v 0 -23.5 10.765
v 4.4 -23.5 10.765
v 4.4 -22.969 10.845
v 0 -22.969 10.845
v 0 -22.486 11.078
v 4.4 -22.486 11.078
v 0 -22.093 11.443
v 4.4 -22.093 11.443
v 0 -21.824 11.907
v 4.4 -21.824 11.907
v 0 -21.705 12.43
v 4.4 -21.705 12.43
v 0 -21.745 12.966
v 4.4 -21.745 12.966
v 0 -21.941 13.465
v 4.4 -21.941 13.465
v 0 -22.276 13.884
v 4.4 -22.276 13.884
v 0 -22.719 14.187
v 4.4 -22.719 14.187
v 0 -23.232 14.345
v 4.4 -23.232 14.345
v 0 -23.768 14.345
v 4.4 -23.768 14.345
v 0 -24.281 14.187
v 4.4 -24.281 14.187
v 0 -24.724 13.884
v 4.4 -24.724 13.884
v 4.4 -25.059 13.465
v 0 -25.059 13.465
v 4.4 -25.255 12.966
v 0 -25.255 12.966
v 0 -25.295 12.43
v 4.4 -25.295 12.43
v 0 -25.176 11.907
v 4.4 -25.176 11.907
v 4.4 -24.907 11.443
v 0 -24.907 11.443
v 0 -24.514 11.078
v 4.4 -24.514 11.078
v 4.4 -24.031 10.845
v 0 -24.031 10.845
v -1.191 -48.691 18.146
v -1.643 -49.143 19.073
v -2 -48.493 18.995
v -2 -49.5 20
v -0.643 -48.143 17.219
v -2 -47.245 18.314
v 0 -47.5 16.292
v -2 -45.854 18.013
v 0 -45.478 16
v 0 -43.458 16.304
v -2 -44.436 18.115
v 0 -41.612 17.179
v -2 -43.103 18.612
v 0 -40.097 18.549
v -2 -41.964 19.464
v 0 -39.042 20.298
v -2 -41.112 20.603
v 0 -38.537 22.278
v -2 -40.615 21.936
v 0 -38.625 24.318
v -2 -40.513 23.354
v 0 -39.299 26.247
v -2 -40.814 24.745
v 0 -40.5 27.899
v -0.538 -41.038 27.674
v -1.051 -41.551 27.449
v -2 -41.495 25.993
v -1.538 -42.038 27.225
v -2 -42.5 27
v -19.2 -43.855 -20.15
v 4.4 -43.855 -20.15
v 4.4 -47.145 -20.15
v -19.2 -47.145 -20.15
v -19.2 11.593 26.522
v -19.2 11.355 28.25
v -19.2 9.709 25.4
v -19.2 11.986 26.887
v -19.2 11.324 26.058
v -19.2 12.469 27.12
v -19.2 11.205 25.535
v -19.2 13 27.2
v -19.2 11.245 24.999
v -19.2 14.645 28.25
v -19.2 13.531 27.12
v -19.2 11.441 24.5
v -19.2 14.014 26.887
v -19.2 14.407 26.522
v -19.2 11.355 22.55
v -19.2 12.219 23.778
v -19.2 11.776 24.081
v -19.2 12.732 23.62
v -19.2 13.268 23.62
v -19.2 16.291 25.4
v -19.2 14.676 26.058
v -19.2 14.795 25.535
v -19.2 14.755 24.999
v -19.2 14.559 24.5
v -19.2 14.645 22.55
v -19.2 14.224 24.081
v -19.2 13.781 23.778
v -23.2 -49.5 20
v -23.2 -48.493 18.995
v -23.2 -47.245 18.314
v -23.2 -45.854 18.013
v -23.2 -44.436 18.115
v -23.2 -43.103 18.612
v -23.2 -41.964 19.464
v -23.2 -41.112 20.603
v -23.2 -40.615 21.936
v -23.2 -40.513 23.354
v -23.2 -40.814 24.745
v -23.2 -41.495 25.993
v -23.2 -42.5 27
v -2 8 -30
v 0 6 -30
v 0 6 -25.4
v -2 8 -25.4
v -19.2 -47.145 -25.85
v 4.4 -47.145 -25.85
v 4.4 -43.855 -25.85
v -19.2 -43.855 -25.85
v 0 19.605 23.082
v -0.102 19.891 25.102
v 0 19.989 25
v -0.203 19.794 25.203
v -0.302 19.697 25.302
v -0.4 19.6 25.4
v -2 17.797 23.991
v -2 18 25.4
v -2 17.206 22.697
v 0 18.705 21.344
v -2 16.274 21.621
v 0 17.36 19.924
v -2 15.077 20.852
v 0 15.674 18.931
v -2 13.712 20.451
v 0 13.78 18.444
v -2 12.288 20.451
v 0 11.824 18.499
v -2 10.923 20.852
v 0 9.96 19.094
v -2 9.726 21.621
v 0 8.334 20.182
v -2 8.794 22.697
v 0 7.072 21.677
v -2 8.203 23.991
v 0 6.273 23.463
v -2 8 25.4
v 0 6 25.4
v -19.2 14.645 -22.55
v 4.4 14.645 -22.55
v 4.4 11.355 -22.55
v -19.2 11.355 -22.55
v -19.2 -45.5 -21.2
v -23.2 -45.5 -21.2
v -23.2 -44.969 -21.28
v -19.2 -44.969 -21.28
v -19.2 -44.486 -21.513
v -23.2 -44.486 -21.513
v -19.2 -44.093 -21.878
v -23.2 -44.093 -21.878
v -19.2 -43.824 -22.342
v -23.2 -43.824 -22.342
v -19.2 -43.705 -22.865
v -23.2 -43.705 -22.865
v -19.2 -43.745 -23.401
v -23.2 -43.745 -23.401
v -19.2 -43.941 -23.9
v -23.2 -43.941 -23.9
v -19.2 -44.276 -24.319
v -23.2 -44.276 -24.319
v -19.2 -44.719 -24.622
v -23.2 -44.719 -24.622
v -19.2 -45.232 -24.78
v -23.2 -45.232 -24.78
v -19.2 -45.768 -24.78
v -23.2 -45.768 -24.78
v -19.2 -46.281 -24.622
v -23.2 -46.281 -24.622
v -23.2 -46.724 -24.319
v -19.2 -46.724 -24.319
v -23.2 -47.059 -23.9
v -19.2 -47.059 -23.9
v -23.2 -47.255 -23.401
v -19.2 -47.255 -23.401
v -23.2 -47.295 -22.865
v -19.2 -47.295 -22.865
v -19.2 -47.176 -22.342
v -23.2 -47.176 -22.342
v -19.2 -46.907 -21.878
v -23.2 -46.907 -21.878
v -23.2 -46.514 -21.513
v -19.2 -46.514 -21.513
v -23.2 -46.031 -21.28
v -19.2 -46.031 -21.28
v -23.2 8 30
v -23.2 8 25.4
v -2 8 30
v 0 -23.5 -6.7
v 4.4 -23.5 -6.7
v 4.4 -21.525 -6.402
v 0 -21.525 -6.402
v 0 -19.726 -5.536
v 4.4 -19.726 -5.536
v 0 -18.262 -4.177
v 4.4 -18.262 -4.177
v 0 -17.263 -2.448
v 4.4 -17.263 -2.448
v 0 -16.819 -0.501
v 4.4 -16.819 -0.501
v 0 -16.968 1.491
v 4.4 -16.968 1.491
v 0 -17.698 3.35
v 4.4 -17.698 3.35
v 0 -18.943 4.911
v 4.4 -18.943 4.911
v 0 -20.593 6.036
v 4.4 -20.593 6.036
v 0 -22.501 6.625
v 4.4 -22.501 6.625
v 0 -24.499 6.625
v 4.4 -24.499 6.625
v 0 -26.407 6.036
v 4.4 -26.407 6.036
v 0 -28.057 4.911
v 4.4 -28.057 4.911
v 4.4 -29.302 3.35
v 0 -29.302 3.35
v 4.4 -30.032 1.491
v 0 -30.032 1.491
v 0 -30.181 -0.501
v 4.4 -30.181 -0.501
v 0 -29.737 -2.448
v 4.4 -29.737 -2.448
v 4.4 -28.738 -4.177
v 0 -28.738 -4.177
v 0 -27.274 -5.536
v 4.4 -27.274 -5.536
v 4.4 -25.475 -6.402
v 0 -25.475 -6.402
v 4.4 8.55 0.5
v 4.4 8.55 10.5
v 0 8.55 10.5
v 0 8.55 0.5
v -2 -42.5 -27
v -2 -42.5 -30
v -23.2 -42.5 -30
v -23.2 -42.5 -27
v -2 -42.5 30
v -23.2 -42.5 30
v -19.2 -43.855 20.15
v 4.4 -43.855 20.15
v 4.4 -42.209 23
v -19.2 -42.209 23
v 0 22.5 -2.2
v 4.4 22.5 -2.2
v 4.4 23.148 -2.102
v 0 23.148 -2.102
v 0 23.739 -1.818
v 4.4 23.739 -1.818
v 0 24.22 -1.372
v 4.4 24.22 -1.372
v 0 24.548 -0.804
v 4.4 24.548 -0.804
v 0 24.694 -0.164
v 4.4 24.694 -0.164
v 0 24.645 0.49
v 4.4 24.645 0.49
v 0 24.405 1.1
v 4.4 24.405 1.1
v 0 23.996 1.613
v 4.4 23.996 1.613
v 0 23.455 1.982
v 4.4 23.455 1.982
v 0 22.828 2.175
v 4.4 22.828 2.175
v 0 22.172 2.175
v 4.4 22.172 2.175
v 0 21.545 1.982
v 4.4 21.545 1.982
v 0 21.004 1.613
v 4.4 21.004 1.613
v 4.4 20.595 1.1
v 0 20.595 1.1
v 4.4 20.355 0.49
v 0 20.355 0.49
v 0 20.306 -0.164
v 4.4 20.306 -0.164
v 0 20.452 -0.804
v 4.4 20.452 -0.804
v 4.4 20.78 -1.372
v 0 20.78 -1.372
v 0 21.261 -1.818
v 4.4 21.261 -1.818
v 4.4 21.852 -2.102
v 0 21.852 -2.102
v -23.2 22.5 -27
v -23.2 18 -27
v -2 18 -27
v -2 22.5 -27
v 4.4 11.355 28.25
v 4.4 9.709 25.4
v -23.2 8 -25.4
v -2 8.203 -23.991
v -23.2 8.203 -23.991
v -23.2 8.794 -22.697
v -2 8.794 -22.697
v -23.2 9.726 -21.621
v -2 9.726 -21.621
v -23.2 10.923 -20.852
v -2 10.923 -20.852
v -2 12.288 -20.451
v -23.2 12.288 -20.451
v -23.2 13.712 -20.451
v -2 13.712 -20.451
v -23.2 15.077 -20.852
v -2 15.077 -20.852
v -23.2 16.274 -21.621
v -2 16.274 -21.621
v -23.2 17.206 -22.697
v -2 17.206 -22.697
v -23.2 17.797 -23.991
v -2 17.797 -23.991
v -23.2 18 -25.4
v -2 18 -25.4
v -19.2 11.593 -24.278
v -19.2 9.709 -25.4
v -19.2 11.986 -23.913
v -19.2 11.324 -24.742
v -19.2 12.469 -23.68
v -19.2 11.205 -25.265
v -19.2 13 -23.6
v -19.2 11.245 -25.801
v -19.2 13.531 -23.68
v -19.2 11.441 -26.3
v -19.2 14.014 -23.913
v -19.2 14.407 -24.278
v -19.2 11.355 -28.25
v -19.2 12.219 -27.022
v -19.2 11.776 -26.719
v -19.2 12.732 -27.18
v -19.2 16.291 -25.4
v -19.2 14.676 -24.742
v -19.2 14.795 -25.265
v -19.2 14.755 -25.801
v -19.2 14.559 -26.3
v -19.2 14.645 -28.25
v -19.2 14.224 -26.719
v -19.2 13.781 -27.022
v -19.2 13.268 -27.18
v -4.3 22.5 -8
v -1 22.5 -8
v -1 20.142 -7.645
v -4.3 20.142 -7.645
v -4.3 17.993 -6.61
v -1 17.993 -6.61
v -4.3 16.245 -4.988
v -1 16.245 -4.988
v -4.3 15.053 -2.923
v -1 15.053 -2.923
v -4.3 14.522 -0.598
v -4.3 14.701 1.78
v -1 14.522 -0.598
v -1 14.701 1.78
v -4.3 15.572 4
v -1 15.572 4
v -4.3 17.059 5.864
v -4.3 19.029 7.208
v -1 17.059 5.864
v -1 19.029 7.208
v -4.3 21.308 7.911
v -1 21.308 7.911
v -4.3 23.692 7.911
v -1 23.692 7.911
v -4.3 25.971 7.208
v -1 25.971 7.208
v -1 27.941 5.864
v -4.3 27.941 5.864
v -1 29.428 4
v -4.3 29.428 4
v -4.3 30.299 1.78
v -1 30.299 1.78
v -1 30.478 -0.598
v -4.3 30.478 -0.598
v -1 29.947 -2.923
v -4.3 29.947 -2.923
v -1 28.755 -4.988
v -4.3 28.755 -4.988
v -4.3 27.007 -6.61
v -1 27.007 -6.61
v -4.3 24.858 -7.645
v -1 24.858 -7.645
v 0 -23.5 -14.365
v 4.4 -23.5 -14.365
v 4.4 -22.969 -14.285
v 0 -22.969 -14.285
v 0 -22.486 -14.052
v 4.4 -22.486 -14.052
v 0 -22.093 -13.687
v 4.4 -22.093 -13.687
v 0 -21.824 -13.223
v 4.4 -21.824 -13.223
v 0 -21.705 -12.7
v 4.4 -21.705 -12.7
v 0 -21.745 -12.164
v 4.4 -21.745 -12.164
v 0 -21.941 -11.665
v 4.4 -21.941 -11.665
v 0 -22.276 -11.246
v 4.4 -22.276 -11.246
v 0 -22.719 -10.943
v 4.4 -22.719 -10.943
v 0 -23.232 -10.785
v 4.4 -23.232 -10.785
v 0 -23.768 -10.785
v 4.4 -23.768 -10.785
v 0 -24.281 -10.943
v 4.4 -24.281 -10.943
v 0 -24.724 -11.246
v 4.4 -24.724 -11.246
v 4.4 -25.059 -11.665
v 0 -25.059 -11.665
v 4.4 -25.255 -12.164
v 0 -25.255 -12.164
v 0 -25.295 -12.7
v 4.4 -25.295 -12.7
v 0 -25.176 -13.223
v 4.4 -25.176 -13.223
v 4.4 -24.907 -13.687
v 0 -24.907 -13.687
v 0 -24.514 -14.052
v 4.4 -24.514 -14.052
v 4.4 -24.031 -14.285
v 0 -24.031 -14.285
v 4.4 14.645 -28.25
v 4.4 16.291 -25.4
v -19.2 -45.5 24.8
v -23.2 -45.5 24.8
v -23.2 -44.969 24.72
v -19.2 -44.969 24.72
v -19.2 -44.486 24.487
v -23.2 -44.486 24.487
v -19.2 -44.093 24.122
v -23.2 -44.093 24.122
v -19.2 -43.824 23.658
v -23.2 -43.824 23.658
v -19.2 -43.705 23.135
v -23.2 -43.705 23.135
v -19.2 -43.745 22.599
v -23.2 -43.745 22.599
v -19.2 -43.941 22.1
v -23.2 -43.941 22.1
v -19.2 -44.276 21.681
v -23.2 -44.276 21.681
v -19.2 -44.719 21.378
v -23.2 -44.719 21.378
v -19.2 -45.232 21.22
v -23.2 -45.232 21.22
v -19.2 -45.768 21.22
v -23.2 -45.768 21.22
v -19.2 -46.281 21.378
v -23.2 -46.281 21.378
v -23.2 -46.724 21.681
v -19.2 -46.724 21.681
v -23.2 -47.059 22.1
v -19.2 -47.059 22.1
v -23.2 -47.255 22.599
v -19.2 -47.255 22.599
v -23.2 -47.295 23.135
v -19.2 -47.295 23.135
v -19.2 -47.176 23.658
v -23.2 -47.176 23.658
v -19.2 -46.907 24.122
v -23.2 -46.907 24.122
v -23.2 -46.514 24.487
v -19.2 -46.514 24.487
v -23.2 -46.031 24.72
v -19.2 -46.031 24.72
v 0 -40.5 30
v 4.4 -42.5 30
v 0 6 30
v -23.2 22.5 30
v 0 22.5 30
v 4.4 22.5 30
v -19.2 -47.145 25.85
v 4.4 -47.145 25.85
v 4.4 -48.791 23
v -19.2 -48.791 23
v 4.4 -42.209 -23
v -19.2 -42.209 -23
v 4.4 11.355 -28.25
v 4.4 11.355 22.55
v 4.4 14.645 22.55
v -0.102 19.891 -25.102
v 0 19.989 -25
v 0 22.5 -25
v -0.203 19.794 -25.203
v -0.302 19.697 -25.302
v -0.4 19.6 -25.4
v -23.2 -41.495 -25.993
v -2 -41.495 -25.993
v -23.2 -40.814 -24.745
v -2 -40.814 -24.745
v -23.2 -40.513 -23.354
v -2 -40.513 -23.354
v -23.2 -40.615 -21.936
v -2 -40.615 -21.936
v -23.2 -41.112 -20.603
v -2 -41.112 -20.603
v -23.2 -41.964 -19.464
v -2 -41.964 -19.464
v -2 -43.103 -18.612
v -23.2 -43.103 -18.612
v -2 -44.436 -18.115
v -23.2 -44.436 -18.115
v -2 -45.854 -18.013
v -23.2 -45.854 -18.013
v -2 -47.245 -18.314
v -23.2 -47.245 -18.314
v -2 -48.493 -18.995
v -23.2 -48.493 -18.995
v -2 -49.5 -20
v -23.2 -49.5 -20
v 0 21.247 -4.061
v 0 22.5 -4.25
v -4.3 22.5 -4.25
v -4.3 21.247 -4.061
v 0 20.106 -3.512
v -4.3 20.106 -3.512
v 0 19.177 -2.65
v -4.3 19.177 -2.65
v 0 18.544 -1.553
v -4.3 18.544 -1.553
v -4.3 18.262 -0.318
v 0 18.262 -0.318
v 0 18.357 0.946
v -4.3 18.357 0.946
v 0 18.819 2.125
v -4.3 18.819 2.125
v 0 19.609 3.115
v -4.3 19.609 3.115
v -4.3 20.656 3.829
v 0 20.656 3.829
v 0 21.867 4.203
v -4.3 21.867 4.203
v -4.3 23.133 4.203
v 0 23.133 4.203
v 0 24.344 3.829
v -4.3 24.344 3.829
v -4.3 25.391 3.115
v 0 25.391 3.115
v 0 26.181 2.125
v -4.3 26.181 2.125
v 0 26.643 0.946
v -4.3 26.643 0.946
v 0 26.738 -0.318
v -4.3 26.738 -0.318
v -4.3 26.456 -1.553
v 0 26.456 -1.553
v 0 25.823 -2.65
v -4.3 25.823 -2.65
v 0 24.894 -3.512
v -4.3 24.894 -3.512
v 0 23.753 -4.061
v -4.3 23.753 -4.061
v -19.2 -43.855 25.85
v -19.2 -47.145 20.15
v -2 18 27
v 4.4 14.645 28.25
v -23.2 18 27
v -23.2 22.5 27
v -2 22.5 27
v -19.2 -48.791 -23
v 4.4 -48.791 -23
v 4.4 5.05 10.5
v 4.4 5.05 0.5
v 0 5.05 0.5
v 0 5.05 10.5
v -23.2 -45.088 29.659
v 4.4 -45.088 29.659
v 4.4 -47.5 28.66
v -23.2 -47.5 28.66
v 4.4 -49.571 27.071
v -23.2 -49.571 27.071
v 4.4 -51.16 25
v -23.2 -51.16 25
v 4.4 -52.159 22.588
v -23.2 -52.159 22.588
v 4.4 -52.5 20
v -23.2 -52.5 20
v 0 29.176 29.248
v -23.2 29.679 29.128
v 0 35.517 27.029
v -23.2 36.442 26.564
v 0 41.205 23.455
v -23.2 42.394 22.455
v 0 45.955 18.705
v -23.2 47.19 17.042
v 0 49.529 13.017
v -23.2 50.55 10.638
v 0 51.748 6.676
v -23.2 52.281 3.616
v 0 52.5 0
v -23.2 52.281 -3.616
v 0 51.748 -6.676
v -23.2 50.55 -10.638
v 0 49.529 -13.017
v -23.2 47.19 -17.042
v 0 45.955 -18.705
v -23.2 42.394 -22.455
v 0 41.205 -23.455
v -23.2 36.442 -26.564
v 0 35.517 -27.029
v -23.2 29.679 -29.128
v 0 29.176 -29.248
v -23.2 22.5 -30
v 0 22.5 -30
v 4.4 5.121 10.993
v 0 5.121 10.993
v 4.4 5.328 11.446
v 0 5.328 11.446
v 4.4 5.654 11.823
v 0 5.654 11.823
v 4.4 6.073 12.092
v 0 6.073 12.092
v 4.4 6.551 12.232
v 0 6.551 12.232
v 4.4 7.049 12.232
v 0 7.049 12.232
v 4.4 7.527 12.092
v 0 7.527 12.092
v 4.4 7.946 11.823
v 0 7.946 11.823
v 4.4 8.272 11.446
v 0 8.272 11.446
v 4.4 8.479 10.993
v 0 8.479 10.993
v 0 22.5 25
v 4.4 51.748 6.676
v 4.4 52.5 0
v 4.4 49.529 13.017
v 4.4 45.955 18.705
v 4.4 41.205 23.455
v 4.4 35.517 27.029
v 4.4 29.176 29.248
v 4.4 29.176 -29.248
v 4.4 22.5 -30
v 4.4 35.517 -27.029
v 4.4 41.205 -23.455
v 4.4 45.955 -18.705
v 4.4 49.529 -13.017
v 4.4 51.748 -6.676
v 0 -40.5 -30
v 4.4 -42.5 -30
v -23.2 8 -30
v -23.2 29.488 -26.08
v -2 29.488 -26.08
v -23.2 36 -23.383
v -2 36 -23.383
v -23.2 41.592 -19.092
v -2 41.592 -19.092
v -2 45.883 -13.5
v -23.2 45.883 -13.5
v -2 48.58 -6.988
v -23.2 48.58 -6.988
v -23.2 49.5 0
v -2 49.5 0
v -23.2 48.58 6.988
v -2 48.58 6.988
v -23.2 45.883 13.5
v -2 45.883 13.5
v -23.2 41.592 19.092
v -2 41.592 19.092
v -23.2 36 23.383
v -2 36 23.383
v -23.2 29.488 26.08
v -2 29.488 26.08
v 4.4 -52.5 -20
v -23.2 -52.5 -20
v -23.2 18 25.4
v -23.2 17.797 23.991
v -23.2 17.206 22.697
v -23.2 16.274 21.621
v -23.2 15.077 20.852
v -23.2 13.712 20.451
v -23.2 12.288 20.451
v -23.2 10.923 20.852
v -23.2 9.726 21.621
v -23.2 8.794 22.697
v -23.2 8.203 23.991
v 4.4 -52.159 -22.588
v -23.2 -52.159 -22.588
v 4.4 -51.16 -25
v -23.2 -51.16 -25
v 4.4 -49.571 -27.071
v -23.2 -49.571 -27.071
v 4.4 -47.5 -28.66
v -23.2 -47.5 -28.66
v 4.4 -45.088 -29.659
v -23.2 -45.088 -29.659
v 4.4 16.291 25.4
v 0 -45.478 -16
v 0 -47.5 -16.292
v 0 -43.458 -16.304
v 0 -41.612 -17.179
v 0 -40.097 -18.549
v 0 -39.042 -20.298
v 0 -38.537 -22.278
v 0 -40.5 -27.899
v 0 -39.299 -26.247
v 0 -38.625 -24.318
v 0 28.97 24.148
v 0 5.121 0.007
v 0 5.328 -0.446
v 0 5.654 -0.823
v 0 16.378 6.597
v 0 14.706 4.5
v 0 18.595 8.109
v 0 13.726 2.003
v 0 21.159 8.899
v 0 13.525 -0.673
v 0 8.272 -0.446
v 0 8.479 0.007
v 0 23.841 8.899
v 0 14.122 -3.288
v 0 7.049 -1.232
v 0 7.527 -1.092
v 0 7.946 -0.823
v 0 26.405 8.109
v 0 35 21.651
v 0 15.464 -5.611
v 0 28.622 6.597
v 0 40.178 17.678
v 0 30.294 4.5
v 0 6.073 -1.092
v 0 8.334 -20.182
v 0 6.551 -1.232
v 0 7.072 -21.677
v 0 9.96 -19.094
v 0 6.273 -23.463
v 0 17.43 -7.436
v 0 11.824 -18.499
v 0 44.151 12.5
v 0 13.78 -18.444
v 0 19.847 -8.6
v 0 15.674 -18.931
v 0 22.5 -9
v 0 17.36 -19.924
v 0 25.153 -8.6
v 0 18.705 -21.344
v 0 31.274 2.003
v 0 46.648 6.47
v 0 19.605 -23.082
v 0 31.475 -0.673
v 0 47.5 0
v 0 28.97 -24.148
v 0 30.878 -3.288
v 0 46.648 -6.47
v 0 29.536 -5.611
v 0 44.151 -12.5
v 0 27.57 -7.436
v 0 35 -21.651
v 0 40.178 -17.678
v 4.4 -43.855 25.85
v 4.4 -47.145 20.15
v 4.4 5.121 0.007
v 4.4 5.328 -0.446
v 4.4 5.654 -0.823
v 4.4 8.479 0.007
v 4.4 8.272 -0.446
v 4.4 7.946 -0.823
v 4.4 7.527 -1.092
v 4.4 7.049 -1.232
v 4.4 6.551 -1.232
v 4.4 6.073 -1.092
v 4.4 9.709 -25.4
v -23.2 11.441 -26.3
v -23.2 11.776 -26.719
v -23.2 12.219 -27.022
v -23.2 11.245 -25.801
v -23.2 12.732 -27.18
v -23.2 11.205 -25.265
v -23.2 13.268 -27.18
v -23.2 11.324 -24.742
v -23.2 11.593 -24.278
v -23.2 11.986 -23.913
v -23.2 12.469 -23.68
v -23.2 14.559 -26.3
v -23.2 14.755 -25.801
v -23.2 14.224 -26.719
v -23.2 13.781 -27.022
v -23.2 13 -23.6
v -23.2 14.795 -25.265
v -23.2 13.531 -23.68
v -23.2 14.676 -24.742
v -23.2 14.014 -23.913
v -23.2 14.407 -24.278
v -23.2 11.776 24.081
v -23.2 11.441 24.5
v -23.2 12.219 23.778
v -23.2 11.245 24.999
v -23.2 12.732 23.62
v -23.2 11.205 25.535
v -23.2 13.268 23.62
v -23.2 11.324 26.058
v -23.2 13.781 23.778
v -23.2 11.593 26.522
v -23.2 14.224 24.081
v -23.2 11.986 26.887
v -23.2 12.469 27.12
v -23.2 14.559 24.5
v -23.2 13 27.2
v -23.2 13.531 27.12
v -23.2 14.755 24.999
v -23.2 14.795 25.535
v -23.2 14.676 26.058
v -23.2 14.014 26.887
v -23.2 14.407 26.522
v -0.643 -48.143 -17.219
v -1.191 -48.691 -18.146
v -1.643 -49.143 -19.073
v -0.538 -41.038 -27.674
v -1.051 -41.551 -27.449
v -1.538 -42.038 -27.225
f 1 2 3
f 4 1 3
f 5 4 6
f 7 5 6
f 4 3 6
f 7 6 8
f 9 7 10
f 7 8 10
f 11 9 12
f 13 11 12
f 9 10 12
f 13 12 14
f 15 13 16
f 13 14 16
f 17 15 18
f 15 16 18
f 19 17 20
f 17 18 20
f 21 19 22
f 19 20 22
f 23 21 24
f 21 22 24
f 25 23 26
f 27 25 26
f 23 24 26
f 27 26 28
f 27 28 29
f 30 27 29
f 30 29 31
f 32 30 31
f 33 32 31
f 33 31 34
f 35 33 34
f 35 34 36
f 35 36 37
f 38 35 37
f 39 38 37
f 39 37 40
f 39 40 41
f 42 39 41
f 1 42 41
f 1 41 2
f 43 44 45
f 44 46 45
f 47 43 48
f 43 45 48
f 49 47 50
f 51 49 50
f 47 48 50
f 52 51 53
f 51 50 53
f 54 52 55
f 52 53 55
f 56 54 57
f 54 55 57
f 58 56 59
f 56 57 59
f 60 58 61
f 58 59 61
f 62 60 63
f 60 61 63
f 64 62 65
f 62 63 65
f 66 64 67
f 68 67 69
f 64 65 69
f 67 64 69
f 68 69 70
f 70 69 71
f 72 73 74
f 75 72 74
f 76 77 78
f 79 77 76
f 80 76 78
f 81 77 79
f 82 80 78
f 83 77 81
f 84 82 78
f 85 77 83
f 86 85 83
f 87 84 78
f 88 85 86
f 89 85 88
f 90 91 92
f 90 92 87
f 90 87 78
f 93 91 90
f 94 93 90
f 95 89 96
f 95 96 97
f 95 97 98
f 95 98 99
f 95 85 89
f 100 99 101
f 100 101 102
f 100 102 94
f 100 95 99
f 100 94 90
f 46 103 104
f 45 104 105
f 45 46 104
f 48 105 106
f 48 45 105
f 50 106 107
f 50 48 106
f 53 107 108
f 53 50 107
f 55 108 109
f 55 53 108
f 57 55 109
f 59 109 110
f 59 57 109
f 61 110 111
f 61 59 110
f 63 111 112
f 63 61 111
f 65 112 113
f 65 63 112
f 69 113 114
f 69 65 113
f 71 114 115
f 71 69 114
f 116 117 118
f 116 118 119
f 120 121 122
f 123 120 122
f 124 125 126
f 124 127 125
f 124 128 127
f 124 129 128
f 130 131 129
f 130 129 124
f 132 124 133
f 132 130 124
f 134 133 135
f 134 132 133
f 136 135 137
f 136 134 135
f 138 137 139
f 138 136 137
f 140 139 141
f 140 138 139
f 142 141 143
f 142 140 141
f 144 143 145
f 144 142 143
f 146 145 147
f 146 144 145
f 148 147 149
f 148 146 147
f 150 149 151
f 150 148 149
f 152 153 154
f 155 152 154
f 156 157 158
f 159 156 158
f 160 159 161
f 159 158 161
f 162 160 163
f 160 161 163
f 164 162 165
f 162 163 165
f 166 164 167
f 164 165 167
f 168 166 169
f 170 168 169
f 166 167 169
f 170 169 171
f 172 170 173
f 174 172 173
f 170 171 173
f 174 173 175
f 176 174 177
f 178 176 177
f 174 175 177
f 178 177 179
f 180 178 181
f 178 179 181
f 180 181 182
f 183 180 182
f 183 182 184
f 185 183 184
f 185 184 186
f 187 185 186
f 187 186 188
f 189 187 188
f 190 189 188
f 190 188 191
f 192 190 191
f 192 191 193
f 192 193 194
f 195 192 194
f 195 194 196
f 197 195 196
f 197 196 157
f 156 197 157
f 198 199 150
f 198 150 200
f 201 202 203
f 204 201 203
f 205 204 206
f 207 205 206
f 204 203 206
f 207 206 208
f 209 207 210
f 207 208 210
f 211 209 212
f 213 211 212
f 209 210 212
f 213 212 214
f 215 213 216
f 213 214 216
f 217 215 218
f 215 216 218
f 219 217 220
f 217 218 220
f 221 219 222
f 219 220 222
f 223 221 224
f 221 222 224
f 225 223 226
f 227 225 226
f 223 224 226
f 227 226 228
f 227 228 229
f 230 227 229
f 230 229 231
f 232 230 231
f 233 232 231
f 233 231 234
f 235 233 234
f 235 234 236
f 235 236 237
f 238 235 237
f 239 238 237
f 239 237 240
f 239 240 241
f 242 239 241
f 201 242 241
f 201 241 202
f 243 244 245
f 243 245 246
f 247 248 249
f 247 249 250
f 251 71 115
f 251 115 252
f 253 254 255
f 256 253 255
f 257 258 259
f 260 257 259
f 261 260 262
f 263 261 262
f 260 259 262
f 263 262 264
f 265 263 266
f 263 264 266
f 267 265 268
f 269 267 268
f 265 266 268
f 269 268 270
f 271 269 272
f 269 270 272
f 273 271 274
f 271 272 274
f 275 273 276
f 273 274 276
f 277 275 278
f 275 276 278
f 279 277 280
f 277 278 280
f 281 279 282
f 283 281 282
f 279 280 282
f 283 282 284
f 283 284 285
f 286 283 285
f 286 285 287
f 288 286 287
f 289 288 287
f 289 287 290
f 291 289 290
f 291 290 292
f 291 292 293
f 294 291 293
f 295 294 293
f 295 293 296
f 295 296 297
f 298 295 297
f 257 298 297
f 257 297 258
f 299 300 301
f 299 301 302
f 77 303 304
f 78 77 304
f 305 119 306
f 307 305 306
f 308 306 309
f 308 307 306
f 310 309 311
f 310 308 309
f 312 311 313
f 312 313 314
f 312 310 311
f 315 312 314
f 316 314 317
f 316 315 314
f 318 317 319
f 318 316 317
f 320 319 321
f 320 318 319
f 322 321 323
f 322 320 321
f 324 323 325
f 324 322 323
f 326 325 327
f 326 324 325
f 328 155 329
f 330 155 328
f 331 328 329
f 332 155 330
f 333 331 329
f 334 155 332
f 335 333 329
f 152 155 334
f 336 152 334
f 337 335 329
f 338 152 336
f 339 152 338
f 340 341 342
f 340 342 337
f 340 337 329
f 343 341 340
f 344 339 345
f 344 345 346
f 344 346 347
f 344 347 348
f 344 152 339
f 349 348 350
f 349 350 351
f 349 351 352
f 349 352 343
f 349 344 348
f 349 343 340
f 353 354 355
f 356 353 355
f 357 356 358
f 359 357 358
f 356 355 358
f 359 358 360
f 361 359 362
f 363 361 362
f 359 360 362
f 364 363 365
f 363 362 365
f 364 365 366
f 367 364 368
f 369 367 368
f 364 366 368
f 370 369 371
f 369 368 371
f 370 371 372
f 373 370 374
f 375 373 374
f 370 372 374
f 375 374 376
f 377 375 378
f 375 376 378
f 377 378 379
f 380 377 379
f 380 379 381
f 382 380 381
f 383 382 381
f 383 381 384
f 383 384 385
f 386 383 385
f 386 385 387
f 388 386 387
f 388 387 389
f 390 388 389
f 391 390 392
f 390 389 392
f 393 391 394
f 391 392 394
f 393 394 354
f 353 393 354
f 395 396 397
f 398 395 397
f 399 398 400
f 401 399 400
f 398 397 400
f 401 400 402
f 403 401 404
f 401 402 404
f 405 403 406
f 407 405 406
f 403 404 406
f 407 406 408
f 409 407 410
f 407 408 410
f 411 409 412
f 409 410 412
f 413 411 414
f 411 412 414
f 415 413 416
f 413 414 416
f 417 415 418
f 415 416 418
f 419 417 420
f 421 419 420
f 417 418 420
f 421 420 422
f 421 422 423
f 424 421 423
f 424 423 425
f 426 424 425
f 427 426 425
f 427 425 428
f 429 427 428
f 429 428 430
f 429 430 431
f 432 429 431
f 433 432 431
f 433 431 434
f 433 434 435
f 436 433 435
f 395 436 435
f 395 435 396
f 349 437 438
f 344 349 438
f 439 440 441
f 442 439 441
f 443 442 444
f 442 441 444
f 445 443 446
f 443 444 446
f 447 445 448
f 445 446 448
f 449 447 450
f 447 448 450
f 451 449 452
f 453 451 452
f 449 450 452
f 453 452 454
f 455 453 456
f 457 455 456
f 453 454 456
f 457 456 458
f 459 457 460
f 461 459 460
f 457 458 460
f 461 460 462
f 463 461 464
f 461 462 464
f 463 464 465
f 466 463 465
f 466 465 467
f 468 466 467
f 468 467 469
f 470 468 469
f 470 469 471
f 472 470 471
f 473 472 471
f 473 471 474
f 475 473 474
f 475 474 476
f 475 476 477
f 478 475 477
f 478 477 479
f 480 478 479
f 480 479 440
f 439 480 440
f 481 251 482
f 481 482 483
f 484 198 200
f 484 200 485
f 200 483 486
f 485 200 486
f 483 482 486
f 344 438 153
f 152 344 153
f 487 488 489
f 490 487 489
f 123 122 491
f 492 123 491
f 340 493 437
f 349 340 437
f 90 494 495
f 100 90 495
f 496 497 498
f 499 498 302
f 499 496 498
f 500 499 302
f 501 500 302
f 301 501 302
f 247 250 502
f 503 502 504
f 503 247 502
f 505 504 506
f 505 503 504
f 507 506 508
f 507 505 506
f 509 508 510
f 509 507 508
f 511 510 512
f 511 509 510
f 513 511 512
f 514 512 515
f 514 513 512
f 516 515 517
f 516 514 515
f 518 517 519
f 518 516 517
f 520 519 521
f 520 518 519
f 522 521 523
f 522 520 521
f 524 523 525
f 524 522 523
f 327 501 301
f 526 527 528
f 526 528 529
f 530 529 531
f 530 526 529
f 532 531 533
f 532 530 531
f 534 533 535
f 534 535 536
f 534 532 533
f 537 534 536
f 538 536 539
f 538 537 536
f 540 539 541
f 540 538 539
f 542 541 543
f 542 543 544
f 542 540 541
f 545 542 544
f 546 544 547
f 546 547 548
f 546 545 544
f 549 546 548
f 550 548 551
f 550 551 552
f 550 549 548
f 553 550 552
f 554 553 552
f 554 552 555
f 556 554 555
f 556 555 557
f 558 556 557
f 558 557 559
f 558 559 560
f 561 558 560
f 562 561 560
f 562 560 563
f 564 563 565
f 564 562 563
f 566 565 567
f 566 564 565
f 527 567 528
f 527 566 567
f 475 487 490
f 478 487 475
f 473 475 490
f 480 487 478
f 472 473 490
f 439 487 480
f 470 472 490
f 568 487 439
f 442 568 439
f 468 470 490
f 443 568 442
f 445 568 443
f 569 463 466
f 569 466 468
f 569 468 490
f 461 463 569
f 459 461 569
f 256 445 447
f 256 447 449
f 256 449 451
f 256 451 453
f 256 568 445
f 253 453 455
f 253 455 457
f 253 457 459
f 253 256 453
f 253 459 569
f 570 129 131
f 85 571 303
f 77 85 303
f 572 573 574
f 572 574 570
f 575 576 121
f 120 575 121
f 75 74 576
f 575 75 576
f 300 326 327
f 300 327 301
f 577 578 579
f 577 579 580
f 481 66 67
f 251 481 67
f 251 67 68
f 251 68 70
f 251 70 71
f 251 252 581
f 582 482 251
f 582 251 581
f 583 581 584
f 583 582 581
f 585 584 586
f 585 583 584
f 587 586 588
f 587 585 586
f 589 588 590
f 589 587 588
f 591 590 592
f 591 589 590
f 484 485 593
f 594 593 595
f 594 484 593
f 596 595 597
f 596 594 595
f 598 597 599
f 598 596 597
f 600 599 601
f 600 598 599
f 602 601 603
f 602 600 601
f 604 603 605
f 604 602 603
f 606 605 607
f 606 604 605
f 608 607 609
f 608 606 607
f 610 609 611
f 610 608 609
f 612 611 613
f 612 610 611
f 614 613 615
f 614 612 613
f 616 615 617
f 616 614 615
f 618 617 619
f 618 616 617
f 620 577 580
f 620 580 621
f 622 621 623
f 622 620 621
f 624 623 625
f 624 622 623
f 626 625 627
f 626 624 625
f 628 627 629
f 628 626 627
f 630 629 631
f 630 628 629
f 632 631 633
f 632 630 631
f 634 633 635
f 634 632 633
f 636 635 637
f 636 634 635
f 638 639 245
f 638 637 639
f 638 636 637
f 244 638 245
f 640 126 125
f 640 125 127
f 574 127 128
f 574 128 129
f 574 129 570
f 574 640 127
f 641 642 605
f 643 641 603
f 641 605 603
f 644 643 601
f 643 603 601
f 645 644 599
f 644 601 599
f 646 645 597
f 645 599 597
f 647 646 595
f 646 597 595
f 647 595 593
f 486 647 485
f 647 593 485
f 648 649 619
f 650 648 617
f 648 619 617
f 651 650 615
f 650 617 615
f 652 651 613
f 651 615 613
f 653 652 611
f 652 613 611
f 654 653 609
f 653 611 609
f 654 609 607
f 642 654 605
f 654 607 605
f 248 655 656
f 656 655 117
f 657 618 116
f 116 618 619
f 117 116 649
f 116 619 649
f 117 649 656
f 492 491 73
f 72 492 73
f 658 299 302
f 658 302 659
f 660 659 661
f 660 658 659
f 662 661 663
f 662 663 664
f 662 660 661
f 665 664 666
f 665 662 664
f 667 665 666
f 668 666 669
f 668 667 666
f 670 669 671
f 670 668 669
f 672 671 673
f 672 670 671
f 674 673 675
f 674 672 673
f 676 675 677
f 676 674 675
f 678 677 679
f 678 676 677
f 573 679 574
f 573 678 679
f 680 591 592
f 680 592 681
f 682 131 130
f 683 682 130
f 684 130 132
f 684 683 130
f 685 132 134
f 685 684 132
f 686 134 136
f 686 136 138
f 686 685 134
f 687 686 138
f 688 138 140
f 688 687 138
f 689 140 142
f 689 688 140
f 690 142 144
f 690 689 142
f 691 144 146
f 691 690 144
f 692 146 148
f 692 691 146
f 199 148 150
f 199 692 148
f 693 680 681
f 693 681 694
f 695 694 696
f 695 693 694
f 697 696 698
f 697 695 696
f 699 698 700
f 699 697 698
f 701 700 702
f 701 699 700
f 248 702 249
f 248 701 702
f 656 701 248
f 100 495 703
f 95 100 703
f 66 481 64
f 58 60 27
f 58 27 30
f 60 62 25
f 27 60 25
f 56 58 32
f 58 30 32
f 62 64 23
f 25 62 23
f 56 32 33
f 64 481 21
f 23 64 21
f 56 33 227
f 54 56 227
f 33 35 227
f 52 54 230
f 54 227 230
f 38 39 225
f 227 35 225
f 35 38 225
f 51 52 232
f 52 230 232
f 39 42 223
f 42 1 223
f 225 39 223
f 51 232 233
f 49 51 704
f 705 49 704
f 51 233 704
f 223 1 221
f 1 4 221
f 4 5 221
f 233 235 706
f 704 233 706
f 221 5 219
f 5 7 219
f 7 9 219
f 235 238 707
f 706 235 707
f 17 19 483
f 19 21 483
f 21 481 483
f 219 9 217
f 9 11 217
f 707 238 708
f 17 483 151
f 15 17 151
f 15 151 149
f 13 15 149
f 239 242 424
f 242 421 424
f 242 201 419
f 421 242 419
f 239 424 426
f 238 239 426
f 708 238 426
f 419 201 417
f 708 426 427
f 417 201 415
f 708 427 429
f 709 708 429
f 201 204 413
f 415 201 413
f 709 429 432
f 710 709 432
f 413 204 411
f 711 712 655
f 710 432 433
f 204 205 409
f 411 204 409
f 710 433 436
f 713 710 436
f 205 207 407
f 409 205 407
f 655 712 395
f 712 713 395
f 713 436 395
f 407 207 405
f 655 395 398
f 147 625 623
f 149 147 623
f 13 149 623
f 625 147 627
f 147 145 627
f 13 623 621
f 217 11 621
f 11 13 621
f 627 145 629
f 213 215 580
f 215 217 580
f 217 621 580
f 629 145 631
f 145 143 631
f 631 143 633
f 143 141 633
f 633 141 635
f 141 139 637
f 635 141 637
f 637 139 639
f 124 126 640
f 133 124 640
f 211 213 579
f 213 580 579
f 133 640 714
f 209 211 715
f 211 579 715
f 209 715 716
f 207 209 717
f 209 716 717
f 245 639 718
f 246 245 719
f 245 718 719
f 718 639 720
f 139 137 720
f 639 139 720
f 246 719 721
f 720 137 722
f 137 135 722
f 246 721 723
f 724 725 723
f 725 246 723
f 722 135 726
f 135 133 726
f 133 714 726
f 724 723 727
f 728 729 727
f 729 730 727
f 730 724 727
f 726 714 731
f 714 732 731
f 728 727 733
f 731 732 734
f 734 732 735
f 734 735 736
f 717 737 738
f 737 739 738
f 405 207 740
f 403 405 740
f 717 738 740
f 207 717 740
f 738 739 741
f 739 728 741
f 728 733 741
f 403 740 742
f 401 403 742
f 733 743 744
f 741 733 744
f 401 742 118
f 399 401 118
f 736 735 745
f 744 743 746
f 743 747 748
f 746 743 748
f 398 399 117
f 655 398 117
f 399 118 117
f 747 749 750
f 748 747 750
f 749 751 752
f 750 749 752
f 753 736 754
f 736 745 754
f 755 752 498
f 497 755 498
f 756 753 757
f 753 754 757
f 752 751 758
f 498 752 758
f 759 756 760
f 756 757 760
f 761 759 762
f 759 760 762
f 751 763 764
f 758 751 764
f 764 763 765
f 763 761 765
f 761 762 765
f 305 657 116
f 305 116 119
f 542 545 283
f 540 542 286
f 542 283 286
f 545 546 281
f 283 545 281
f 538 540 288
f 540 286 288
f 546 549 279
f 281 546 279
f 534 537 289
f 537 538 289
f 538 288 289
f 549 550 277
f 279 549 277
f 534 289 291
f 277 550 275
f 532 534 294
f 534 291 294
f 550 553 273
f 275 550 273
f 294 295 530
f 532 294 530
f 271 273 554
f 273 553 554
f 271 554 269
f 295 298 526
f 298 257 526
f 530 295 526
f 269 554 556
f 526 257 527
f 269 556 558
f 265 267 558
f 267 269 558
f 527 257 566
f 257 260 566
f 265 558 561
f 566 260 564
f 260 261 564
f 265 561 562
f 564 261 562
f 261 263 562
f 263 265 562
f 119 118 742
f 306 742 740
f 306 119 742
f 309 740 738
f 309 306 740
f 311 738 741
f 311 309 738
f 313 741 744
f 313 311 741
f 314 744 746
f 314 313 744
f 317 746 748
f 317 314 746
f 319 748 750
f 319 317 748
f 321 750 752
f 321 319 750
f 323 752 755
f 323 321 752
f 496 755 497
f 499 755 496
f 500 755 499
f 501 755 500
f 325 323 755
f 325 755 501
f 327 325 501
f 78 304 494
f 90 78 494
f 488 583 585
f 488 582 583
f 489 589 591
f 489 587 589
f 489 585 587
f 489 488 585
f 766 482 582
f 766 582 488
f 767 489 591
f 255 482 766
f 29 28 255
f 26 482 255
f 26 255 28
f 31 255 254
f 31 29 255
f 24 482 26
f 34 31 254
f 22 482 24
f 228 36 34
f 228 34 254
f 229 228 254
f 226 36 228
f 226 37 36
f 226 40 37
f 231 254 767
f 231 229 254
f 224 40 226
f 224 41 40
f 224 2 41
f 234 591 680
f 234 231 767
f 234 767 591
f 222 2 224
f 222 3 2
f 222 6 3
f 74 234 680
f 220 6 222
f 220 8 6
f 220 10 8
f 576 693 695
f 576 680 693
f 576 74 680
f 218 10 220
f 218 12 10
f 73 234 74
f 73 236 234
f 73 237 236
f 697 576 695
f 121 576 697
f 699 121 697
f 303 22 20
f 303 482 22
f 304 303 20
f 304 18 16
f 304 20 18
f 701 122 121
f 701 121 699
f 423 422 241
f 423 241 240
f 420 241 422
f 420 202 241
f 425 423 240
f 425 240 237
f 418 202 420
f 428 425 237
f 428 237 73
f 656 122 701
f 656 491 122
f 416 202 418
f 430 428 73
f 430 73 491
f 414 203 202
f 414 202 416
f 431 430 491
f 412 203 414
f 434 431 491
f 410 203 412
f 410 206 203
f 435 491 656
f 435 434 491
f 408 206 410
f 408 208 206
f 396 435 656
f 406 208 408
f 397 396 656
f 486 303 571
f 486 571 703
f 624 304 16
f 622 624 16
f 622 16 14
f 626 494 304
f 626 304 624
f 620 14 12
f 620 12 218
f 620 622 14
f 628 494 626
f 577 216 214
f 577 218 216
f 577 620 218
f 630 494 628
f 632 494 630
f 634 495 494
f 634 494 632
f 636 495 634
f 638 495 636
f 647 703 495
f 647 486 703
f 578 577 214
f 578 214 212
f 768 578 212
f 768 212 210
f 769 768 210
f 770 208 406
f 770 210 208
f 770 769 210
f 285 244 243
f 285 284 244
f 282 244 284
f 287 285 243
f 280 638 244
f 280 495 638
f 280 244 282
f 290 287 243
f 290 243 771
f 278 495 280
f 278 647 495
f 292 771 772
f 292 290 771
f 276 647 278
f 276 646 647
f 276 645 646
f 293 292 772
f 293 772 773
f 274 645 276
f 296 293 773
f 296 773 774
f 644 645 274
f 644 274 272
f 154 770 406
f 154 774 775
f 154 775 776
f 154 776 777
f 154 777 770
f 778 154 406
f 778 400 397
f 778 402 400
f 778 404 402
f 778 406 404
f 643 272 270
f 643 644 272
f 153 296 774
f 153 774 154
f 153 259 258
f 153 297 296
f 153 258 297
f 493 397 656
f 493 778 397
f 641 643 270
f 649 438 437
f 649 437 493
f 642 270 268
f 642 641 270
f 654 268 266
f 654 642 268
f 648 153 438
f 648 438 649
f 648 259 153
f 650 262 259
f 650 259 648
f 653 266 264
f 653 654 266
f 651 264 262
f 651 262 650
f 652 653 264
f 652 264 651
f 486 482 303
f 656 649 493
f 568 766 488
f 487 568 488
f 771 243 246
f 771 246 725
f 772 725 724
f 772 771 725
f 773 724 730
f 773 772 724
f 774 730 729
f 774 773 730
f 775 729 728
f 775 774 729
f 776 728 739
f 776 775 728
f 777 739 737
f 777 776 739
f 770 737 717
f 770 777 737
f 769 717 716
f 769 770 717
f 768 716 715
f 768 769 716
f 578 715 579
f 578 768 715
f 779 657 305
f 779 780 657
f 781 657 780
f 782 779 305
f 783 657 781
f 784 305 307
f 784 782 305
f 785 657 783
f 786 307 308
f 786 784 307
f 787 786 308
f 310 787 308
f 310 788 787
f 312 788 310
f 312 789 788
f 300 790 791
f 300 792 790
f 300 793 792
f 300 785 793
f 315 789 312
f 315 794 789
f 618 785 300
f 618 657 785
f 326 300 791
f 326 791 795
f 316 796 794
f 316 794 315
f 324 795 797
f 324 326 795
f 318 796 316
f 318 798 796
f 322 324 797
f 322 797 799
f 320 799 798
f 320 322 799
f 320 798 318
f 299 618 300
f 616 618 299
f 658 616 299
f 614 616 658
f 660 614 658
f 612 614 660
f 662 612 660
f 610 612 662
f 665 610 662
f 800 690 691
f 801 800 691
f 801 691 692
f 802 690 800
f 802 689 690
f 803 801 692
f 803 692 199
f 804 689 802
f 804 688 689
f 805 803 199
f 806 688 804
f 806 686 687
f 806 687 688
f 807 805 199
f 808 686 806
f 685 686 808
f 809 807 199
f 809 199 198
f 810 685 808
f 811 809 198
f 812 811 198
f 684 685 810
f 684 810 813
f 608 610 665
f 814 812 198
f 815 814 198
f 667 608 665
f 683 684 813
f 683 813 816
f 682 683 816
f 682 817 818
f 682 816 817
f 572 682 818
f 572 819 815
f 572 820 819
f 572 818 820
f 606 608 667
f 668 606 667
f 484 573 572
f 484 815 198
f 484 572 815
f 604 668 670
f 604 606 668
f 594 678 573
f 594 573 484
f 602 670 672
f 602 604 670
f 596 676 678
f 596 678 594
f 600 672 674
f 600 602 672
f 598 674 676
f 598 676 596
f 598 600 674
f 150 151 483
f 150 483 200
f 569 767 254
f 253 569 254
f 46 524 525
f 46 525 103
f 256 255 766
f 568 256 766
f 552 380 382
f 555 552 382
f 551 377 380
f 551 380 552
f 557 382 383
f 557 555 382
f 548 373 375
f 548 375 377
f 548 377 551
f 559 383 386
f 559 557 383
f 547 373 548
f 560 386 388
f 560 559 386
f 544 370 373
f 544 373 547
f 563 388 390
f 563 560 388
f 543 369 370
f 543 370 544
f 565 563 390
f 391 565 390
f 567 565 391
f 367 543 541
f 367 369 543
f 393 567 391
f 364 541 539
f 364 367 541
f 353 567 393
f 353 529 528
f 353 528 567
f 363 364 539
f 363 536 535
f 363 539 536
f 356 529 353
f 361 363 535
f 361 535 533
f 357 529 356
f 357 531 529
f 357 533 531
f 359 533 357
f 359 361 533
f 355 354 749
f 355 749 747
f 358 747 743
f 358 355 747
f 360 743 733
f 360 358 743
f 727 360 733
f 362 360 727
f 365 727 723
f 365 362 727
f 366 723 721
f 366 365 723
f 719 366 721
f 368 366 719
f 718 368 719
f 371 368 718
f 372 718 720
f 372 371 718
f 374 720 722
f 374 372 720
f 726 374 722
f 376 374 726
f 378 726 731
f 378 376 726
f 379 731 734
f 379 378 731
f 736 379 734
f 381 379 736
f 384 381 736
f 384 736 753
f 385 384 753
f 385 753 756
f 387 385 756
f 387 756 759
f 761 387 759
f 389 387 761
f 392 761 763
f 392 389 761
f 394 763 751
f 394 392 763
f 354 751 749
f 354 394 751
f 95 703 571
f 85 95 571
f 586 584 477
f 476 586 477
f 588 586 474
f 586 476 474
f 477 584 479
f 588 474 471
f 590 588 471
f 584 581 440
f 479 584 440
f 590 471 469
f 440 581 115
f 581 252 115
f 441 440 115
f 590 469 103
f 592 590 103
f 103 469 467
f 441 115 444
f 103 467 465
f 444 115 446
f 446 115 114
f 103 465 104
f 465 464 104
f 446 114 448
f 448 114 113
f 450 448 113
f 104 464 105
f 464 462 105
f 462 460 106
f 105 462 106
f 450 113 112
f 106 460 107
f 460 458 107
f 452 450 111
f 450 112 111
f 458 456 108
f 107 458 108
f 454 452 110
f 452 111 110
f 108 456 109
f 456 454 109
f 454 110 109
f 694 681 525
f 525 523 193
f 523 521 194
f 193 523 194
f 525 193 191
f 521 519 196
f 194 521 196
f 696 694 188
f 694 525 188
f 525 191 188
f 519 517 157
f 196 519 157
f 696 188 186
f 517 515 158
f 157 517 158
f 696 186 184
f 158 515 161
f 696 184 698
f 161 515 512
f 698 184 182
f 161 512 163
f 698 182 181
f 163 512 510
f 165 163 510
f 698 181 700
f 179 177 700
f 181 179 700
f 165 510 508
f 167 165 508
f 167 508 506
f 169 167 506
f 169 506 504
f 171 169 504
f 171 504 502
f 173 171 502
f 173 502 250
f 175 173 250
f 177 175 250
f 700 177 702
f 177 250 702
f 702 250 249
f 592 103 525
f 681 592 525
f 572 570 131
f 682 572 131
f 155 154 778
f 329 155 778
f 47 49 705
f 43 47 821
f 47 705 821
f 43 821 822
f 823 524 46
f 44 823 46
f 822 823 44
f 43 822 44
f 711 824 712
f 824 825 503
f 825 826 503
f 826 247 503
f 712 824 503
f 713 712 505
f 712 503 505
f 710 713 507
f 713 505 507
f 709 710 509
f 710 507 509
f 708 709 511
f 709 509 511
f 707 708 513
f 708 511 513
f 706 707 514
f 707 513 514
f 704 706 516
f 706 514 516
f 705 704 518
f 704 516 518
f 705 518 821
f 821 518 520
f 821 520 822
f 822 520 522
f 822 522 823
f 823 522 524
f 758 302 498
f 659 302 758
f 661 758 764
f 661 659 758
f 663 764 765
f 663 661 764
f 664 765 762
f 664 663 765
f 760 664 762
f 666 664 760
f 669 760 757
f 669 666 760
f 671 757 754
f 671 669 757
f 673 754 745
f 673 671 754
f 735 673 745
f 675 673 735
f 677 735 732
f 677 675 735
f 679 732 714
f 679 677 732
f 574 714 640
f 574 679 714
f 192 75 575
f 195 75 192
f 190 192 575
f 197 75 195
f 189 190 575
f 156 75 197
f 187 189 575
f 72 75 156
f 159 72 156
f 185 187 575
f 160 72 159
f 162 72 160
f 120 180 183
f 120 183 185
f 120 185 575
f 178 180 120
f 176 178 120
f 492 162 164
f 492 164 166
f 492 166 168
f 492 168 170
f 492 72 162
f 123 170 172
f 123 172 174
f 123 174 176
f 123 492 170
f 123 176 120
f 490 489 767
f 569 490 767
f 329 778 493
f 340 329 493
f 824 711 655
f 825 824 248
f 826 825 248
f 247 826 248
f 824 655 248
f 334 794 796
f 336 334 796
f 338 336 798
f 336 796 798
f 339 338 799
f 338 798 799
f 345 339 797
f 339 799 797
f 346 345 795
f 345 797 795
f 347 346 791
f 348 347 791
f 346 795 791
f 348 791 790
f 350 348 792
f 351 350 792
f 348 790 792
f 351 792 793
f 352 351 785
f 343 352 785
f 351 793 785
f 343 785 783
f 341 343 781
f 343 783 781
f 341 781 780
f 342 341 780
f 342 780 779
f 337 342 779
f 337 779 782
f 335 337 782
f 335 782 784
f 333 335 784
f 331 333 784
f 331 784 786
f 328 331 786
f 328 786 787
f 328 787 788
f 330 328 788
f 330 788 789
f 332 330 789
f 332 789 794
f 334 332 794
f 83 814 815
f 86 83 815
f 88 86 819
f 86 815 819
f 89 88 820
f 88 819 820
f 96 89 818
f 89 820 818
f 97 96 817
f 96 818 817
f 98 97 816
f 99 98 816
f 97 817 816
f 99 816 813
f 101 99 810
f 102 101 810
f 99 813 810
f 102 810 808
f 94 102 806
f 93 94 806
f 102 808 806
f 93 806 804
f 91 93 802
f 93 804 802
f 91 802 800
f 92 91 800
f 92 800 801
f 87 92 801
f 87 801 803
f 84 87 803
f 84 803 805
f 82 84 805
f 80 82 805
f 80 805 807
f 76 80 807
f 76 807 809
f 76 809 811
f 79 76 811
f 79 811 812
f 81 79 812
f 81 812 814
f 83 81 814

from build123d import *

# Parameters (mm, degrees)
SKETCH1_W           = 60
SKETCH1_H           = 105
BOSS_EXTRUDE1_DEPTH = 4.4
SKETCH2_R           = 2.2
SKETCH2_R_2         = 6.7
SKETCH2_R_3         = 1.8
CUT_EXTRUDE1_DEPTH  = 61.626809251
CUT_EXTRUDE2_DEPTH  = 61.626809251
SKETCH5_R           = 8
SKETCH5_R_2         = 4.25
BOSS_EXTRUDE2_DEPTH = 4.3
CHAMFER1_SIZE       = 1
CUT_EXTRUDE3_DEPTH  = 61.626809251
BOSS_EXTRUDE3_START = 23.2
BOSS_EXTRUDE3_DEPTH = 23.2
SKETCH8_R           = 1.8
CUT_EXTRUDE4_DEPTH  = 67.468112656
FILLET1_R           = 10
BOSS_EXTRUDE4_DEPTH = 23.2
SKETCH11_R          = 1.8
CUT_EXTRUDE6_DEPTH  = 67.468112656
CUT_EXTRUDE5_DEPTH  = 23.6
CHAMFER2_SIZE       = 2


with BuildPart() as part:
    # Sketch1 → Boss-Extrude1 (new body)
    with BuildSketch(Plane(origin=(0, 0, 0), x_dir=(0, 0, -1), z_dir=(1, 0, 0))):
        Rectangle(SKETCH1_W, SKETCH1_H)
    extrude(amount=BOSS_EXTRUDE1_DEPTH)

    # Sketch2 → Cut-Extrude1 (cut, through all)
    with BuildSketch(Plane(origin=(4.4, 0, 0), x_dir=(0, 0, -1), z_dir=(1, 0, 0))):
        with Locations((0, 22.5)):
            Circle(SKETCH2_R)
        with Locations((0, -23.5)):
            Circle(SKETCH2_R_2)
        with Locations((-12.565, -23.5)):
            Circle(SKETCH2_R_3)
        with Locations((12.565, -23.5)):
            Circle(SKETCH2_R_3)
    extrude(amount=-CUT_EXTRUDE1_DEPTH, mode=Mode.SUBTRACT)

    # Sketch4 → Cut-Extrude2 (cut, through all)
    with BuildSketch(Plane(origin=(4.4, 0, 0), x_dir=(0, 0, -1), z_dir=(1, 0, 0))):
        with BuildLine():
            Line((-10.5, 8.55), (-0.5, 8.55))
            ThreePointArc((-0.5, 8.55), (1.25, 6.8), (-0.5, 5.05))
            Line((-0.5, 5.05), (-10.5, 5.05))
            ThreePointArc((-10.5, 5.05), (-12.25, 6.8), (-10.5, 8.55))
        make_face()
    extrude(amount=-CUT_EXTRUDE2_DEPTH, mode=Mode.SUBTRACT)

    # Sketch5 → Boss-Extrude2 (add)
    with BuildSketch(Plane.ZY):
        with Locations(Location((0, 22.5, 0), (0, 0, 180))):
            Circle(SKETCH5_R)
        with Locations(Location((0, 22.5, 0), (0, 0, 180))):
            Circle(SKETCH5_R_2, mode=Mode.SUBTRACT)
    extrude(amount=BOSS_EXTRUDE2_DEPTH)

    # Chamfer1
    chamfer1_edges = [part.edges().sort_by_distance(p)[0] for p in [
        (0, 22.5, 8),
    ]]
    chamfer(chamfer1_edges, length=CHAMFER1_SIZE)

    # Sketch6 → Cut-Extrude3 (cut, through all)
    with BuildSketch(Plane.ZY):
        with BuildLine():
            Line((-30, 52.5), (-30, 22.5))
            ThreePointArc((-30, 22.5), (-21.213203436, 43.713203436), (0, 52.5))
            Line((0, 52.5), (-30, 52.5))
        make_face()
        with BuildLine():
            Line((30, 52.5), (0, 52.5))
            ThreePointArc((0, 52.5), (21.213203436, 43.713203436), (30, 22.5))
            Line((30, 22.5), (30, 52.5))
        make_face()
    extrude(amount=-CUT_EXTRUDE3_DEPTH, mode=Mode.SUBTRACT)

    # Sketch7 → Boss-Extrude3 (add)
    with BuildSketch(Plane.ZY.offset(BOSS_EXTRUDE3_START)):
        with BuildLine():
            Line((-30, 22.5), (-30, 8))
            Line((-30, 8), (-27, 8))
            Line((-27, 8), (-25.4, 8))
            ThreePointArc((-25.4, 8), (-20.4, 13), (-25.4, 18))
            Line((-25.4, 18), (-27, 18))
            Line((-27, 18), (-27, 22.5))
            ThreePointArc((-27, 22.5), (0, 49.5), (27, 22.5))
            Line((27, 22.5), (27, 18))
            Line((27, 18), (25.4, 18))
            ThreePointArc((25.4, 18), (20.4, 13), (25.4, 8))
            Line((25.4, 8), (27, 8))
            Line((27, 8), (30, 8))
            Line((30, 8), (30, 22.5))
            ThreePointArc((30, 22.5), (0, 52.5), (-30, 22.5))
        make_face()
    extrude(amount=-BOSS_EXTRUDE3_DEPTH)

    # Sketch8 → Cut-Extrude4 (cut, through all)
    with BuildSketch(Plane.ZY.offset(23.2)):
        with Locations((-25.4, 13)):
            Circle(SKETCH8_R)
        with Locations((25.4, 13)):
            Circle(SKETCH8_R)
    extrude(amount=-CUT_EXTRUDE4_DEPTH, mode=Mode.SUBTRACT)

    # Fillet1
    fillet1_edges = [part.edges().sort_by_distance(p)[0] for p in [
        (2.2, -52.5, -30),
        (2.2, -52.5, 30),
    ]]
    fillet(fillet1_edges, radius=FILLET1_R)

    # Sketch10 → Boss-Extrude4 (add)
    with BuildSketch(Plane.ZY):
        with BuildLine():
            Line((20, -52.5), (-20, -52.5))
            ThreePointArc((-20, -52.5), (-27.071067812, -49.571067812), (-30, -42.5))
            Line((-30, -42.5), (-27, -42.5))
            ThreePointArc((-27, -42.5), (-19.464466094, -41.964466094), (-20, -49.5))
            Line((-20, -49.5), (20, -49.5))
            ThreePointArc((20, -49.5), (19.464466094, -41.964466094), (27, -42.5))
            Line((27, -42.5), (30, -42.5))
            ThreePointArc((30, -42.5), (27.071067812, -49.571067812), (20, -52.5))
        make_face()
    extrude(amount=BOSS_EXTRUDE4_DEPTH)

    # Sketch11 → Cut-Extrude6 (cut, through all)
    with BuildSketch(Plane.ZY.offset(23.2)):
        with Locations((-23, -45.5)):
            Circle(SKETCH11_R)
        with Locations((23, -45.5)):
            Circle(SKETCH11_R)
    extrude(amount=-CUT_EXTRUDE6_DEPTH, mode=Mode.SUBTRACT)

    # Sketch9 → Cut-Extrude5 (cut)
    with BuildSketch(Plane(origin=(4.4, 0, 0), x_dir=(0, 0, -1), z_dir=(1, 0, 0))):
        Polygon((-25.4, 9.709103466), (-22.55, 11.354551733), (-22.55, 14.645448267), (-25.4, 16.290896534), (-28.25, 14.645448267), (-28.25, 11.354551733), align=None)
        Polygon((25.4, 9.709103466), (28.25, 11.354551733), (28.25, 14.645448267), (25.4, 16.290896534), (22.55, 14.645448267), (22.55, 11.354551733), align=None)
        Polygon((-23, -42.209103466), (-25.85, -43.854551733), (-25.85, -47.145448267), (-23, -48.790896534), (-20.15, -47.145448267), (-20.15, -43.854551733), align=None)
        Polygon((23, -48.790896534), (25.85, -47.145448267), (25.85, -43.854551733), (23, -42.209103466), (20.15, -43.854551733), (20.15, -47.145448267), align=None)
    extrude(amount=-CUT_EXTRUDE5_DEPTH, mode=Mode.SUBTRACT)

    # Chamfer2
    # the kernel refuses this chamfer: 2 mm, written as the material it adds along each edge
    with BuildSketch(Plane(origin=(0, 12.856634024, -27), x_dir=(0.02749587661058639, 0, 0.9996219169112968), z_dir=(0, 1, 0))) as chamfer2_piece_1_section:
        Polygon((CHAMFER2_SIZE * 0.999621916911, -CHAMFER2_SIZE * 0.0274958766106), (-CHAMFER2_SIZE * 0.0274958766106, -CHAMFER2_SIZE * 0.999621916911), (0, 0), align=None)
    chamfer2_piece_1 = extrude(amount=9.643365976, mode=Mode.PRIVATE)
    chamfer2_piece_1 = split(chamfer2_piece_1, bisect_by=Plane(origin=(-0.079985343, 16.613435796, -25.958654389), z_dir=(0, 0.866025403784439, 0.4999999999999995)), keep=Keep.TOP, mode=Mode.PRIVATE)
    add(chamfer2_piece_1)
    with BuildSketch(Plane(origin=(0, 22.5, 27), x_dir=(0.02749587661058639, 0, -0.9996219169112968), z_dir=(0, -1, 0))) as chamfer2_piece_2_section:
        Polygon((CHAMFER2_SIZE * 0.999621916911, -CHAMFER2_SIZE * 0.0274958766106), (-CHAMFER2_SIZE * 0.0274958766106, -CHAMFER2_SIZE * 0.999621916911), (0, 0), align=None)
    chamfer2_piece_2 = extrude(amount=9.643365976, mode=Mode.PRIVATE)
    chamfer2_piece_2 = split(chamfer2_piece_2, bisect_by=Plane(origin=(-0.629221359, 16.946033943, 24.265268722), z_dir=(0, 0.8660254037844389, 0.4999999999999995)), keep=Keep.TOP, mode=Mode.PRIVATE)
    add(chamfer2_piece_2)
    with BuildSketch(Plane(origin=(0, 22.5, 0), x_dir=(0, 0, -1), z_dir=(0, -1, 0))) as chamfer2_piece_3:
        Polygon((27 - CHAMFER2_SIZE, 0), (27, -CHAMFER2_SIZE), (27, 0), align=None)
    revolve(axis=Axis((0, 22.5, 0), (1, 0, 0)), revolution_arc=180)
    with BuildSketch(Plane(origin=(0, 13, 25.4), x_dir=(0, 1, 0), z_dir=(0, 0, 1))) as chamfer2_piece_4:
        Polygon((5 + CHAMFER2_SIZE, 0), (5, CHAMFER2_SIZE), (5, 0), align=None)
    revolve(axis=Axis((0, 13, 25.4), (-1, 0, 0)), revolution_arc=180)
    with BuildSketch(Plane(origin=(0, 8, 25.4), x_dir=(0.027495876610586365, -0.9996219169112968, 0), z_dir=(0, 0, 1)), Plane(origin=(0, 8, -30), x_dir=(0.027495876610586365, -0.9996219169112968, 0), z_dir=(0, 0, 1))) as chamfer2_piece_5:
        Polygon((CHAMFER2_SIZE * 0.999621916911, -CHAMFER2_SIZE * 0.0274958766106), (-CHAMFER2_SIZE * 0.0274958766106, -CHAMFER2_SIZE * 0.999621916911), (0, 0), align=None)
    extrude(amount=4.6)
    with BuildSketch(Plane(origin=(0, 13, -25.4), x_dir=(0, -1, 0), z_dir=(0, 0, -1))) as chamfer2_piece_6:
        Polygon((5 + CHAMFER2_SIZE, 0), (5, CHAMFER2_SIZE), (5, 0), align=None)
    revolve(axis=Axis((0, 13, -25.4), (-1, 0, 0)), revolution_arc=180)
    with BuildSketch(Plane(origin=(0, -42.5, -30), x_dir=(0.02749587661058639, 0.9996219169112968, 0), z_dir=(0, 0, 1))) as chamfer2_piece_7_section:
        Polygon((CHAMFER2_SIZE * 0.999621916911, CHAMFER2_SIZE * 0.0274958766106), (-CHAMFER2_SIZE * 0.0274958766106, CHAMFER2_SIZE * 0.999621916911), (0, 0), align=None)
    chamfer2_piece_7 = extrude(amount=8.143365976, mode=Mode.PRIVATE)
    chamfer2_piece_7 = split(chamfer2_piece_7, bisect_by=Plane(origin=(-0.399536962, -44.995246479, -27.825741256), z_dir=(0, 0.8660254037844387, -0.4999999999999999)), keep=Keep.TOP, mode=Mode.PRIVATE)
    add(chamfer2_piece_7)
    with BuildSketch(Plane(origin=(0, -42.5, 21.856634024), x_dir=(0.02749587661058639, 0.9996219169112968, 0), z_dir=(0, 0, 1))) as chamfer2_piece_8_section:
        Polygon((CHAMFER2_SIZE * 0.999621916911, CHAMFER2_SIZE * 0.0274958766106), (-CHAMFER2_SIZE * 0.0274958766106, CHAMFER2_SIZE * 0.999621916911), (0, 0), align=None)
    chamfer2_piece_8 = extrude(amount=8.143365976, mode=Mode.PRIVATE)
    chamfer2_piece_8 = split(chamfer2_piece_8, bisect_by=Plane(origin=(-0.031503092, -41.384608505, 21.571932838), z_dir=(0, 0.8660254037844383, 0.5000000000000008)), keep=Keep.TOP, mode=Mode.PRIVATE)
    add(chamfer2_piece_8)
    with BuildSketch(Plane(origin=(0, -45.5, 23), x_dir=(0, -0.9259929219168064, 0.37754087005246884), z_dir=(0, 0.37754087005246884, 0.9259929219168064))) as chamfer2_piece_9_section:
        Polygon((5 + CHAMFER2_SIZE, 0), (5, -CHAMFER2_SIZE), (5, 0), align=None)
    chamfer2_piece_9 = revolve(axis=Axis((0, -45.5, 23), (1, 0, 0)), revolution_arc=314.36288287, mode=Mode.PRIVATE)
    chamfer2_piece_9 = chamfer2_piece_9 & Plane(origin=(-0.670588615, -42.5, 20), x_dir=(0, 0, 1), z_dir=(1, 0, 0)) * Cylinder(10, 28, mode=Mode.PRIVATE)
    add(chamfer2_piece_9)
    with BuildSketch(Plane(origin=(0, -45.5, -23), x_dir=(0, -0.3775408700524707, -0.9259929219168057), z_dir=(0, -0.9259929219168057, 0.3775408700524707))) as chamfer2_piece_10_section:
        Polygon((5 + CHAMFER2_SIZE, 0), (5, -CHAMFER2_SIZE), (5, 0), align=None)
    chamfer2_piece_10 = revolve(axis=Axis((0, -45.5, -23), (1, 0, 0)), revolution_arc=314.36288287, mode=Mode.PRIVATE)
    chamfer2_piece_10 = chamfer2_piece_10 & Plane(origin=(-0.979908178, -42.5, -20), x_dir=(0, -1, 0), z_dir=(1, 0, 0)) * Cylinder(10, 28, mode=Mode.PRIVATE)
    add(chamfer2_piece_10)
    with BuildSketch(Plane(origin=(0, -49.5, -25.143365976), x_dir=(0.02749587661058639, 0.9996219169112968, 0), z_dir=(0, 0, 1))) as chamfer2_piece_11_section:
        Polygon((CHAMFER2_SIZE * 0.999621916911, CHAMFER2_SIZE * 0.0274958766106), (-CHAMFER2_SIZE * 0.0274958766106, CHAMFER2_SIZE * 0.999621916911), (0, 0), align=None)
    chamfer2_piece_11 = extrude(amount=50.286731952, mode=Mode.PRIVATE)
    chamfer2_piece_11 = split(chamfer2_piece_11, bisect_by=Plane(origin=(-0.67159105, -38.844675798, 5.772640341), z_dir=(0, -0.8660254037844397, -0.4999999999999982)), keep=Keep.TOP, mode=Mode.PRIVATE)
    chamfer2_piece_11 = split(chamfer2_piece_11, bisect_by=Plane(origin=(-0.67159105, -38.844675769, -5.77264029), z_dir=(0, -0.8660254037844408, 0.4999999999999964)), keep=Keep.TOP, mode=Mode.PRIVATE)
    add(chamfer2_piece_11)
    with BuildSketch(Plane(origin=(0, 18, -25.4), x_dir=(0.02749587661058639, 0.9996219169112968, 0), z_dir=(0, 0, -1))) as chamfer2_piece_12_section:
        Polygon((CHAMFER2_SIZE * 0.999621916911, -CHAMFER2_SIZE * 0.0274958766106), (-CHAMFER2_SIZE * 0.0274958766106, -CHAMFER2_SIZE * 0.999621916911), (0, 0), align=None)
    chamfer2_piece_12 = extrude(amount=6.743365976, mode=Mode.PRIVATE)
    chamfer2_piece_12 = split(chamfer2_piece_12, bisect_by=Plane(origin=(-0.666666667, 18.666666667, -30), z_dir=(0, 0, 1)), keep=Keep.TOP, mode=Mode.PRIVATE)
    add(chamfer2_piece_12)
    with BuildSketch(Plane(origin=(0, 18, 27), x_dir=(0.02749587661058639, 0.9996219169112968, 0), z_dir=(0, 0, -1))) as chamfer2_piece_13:
        Polygon((CHAMFER2_SIZE * 0.999621916911, -CHAMFER2_SIZE * 0.0274958766106), (-CHAMFER2_SIZE * 0.0274958766106, -CHAMFER2_SIZE * 0.999621916911), (0, 0), align=None)
    extrude(amount=1.6)


solid = part.part
